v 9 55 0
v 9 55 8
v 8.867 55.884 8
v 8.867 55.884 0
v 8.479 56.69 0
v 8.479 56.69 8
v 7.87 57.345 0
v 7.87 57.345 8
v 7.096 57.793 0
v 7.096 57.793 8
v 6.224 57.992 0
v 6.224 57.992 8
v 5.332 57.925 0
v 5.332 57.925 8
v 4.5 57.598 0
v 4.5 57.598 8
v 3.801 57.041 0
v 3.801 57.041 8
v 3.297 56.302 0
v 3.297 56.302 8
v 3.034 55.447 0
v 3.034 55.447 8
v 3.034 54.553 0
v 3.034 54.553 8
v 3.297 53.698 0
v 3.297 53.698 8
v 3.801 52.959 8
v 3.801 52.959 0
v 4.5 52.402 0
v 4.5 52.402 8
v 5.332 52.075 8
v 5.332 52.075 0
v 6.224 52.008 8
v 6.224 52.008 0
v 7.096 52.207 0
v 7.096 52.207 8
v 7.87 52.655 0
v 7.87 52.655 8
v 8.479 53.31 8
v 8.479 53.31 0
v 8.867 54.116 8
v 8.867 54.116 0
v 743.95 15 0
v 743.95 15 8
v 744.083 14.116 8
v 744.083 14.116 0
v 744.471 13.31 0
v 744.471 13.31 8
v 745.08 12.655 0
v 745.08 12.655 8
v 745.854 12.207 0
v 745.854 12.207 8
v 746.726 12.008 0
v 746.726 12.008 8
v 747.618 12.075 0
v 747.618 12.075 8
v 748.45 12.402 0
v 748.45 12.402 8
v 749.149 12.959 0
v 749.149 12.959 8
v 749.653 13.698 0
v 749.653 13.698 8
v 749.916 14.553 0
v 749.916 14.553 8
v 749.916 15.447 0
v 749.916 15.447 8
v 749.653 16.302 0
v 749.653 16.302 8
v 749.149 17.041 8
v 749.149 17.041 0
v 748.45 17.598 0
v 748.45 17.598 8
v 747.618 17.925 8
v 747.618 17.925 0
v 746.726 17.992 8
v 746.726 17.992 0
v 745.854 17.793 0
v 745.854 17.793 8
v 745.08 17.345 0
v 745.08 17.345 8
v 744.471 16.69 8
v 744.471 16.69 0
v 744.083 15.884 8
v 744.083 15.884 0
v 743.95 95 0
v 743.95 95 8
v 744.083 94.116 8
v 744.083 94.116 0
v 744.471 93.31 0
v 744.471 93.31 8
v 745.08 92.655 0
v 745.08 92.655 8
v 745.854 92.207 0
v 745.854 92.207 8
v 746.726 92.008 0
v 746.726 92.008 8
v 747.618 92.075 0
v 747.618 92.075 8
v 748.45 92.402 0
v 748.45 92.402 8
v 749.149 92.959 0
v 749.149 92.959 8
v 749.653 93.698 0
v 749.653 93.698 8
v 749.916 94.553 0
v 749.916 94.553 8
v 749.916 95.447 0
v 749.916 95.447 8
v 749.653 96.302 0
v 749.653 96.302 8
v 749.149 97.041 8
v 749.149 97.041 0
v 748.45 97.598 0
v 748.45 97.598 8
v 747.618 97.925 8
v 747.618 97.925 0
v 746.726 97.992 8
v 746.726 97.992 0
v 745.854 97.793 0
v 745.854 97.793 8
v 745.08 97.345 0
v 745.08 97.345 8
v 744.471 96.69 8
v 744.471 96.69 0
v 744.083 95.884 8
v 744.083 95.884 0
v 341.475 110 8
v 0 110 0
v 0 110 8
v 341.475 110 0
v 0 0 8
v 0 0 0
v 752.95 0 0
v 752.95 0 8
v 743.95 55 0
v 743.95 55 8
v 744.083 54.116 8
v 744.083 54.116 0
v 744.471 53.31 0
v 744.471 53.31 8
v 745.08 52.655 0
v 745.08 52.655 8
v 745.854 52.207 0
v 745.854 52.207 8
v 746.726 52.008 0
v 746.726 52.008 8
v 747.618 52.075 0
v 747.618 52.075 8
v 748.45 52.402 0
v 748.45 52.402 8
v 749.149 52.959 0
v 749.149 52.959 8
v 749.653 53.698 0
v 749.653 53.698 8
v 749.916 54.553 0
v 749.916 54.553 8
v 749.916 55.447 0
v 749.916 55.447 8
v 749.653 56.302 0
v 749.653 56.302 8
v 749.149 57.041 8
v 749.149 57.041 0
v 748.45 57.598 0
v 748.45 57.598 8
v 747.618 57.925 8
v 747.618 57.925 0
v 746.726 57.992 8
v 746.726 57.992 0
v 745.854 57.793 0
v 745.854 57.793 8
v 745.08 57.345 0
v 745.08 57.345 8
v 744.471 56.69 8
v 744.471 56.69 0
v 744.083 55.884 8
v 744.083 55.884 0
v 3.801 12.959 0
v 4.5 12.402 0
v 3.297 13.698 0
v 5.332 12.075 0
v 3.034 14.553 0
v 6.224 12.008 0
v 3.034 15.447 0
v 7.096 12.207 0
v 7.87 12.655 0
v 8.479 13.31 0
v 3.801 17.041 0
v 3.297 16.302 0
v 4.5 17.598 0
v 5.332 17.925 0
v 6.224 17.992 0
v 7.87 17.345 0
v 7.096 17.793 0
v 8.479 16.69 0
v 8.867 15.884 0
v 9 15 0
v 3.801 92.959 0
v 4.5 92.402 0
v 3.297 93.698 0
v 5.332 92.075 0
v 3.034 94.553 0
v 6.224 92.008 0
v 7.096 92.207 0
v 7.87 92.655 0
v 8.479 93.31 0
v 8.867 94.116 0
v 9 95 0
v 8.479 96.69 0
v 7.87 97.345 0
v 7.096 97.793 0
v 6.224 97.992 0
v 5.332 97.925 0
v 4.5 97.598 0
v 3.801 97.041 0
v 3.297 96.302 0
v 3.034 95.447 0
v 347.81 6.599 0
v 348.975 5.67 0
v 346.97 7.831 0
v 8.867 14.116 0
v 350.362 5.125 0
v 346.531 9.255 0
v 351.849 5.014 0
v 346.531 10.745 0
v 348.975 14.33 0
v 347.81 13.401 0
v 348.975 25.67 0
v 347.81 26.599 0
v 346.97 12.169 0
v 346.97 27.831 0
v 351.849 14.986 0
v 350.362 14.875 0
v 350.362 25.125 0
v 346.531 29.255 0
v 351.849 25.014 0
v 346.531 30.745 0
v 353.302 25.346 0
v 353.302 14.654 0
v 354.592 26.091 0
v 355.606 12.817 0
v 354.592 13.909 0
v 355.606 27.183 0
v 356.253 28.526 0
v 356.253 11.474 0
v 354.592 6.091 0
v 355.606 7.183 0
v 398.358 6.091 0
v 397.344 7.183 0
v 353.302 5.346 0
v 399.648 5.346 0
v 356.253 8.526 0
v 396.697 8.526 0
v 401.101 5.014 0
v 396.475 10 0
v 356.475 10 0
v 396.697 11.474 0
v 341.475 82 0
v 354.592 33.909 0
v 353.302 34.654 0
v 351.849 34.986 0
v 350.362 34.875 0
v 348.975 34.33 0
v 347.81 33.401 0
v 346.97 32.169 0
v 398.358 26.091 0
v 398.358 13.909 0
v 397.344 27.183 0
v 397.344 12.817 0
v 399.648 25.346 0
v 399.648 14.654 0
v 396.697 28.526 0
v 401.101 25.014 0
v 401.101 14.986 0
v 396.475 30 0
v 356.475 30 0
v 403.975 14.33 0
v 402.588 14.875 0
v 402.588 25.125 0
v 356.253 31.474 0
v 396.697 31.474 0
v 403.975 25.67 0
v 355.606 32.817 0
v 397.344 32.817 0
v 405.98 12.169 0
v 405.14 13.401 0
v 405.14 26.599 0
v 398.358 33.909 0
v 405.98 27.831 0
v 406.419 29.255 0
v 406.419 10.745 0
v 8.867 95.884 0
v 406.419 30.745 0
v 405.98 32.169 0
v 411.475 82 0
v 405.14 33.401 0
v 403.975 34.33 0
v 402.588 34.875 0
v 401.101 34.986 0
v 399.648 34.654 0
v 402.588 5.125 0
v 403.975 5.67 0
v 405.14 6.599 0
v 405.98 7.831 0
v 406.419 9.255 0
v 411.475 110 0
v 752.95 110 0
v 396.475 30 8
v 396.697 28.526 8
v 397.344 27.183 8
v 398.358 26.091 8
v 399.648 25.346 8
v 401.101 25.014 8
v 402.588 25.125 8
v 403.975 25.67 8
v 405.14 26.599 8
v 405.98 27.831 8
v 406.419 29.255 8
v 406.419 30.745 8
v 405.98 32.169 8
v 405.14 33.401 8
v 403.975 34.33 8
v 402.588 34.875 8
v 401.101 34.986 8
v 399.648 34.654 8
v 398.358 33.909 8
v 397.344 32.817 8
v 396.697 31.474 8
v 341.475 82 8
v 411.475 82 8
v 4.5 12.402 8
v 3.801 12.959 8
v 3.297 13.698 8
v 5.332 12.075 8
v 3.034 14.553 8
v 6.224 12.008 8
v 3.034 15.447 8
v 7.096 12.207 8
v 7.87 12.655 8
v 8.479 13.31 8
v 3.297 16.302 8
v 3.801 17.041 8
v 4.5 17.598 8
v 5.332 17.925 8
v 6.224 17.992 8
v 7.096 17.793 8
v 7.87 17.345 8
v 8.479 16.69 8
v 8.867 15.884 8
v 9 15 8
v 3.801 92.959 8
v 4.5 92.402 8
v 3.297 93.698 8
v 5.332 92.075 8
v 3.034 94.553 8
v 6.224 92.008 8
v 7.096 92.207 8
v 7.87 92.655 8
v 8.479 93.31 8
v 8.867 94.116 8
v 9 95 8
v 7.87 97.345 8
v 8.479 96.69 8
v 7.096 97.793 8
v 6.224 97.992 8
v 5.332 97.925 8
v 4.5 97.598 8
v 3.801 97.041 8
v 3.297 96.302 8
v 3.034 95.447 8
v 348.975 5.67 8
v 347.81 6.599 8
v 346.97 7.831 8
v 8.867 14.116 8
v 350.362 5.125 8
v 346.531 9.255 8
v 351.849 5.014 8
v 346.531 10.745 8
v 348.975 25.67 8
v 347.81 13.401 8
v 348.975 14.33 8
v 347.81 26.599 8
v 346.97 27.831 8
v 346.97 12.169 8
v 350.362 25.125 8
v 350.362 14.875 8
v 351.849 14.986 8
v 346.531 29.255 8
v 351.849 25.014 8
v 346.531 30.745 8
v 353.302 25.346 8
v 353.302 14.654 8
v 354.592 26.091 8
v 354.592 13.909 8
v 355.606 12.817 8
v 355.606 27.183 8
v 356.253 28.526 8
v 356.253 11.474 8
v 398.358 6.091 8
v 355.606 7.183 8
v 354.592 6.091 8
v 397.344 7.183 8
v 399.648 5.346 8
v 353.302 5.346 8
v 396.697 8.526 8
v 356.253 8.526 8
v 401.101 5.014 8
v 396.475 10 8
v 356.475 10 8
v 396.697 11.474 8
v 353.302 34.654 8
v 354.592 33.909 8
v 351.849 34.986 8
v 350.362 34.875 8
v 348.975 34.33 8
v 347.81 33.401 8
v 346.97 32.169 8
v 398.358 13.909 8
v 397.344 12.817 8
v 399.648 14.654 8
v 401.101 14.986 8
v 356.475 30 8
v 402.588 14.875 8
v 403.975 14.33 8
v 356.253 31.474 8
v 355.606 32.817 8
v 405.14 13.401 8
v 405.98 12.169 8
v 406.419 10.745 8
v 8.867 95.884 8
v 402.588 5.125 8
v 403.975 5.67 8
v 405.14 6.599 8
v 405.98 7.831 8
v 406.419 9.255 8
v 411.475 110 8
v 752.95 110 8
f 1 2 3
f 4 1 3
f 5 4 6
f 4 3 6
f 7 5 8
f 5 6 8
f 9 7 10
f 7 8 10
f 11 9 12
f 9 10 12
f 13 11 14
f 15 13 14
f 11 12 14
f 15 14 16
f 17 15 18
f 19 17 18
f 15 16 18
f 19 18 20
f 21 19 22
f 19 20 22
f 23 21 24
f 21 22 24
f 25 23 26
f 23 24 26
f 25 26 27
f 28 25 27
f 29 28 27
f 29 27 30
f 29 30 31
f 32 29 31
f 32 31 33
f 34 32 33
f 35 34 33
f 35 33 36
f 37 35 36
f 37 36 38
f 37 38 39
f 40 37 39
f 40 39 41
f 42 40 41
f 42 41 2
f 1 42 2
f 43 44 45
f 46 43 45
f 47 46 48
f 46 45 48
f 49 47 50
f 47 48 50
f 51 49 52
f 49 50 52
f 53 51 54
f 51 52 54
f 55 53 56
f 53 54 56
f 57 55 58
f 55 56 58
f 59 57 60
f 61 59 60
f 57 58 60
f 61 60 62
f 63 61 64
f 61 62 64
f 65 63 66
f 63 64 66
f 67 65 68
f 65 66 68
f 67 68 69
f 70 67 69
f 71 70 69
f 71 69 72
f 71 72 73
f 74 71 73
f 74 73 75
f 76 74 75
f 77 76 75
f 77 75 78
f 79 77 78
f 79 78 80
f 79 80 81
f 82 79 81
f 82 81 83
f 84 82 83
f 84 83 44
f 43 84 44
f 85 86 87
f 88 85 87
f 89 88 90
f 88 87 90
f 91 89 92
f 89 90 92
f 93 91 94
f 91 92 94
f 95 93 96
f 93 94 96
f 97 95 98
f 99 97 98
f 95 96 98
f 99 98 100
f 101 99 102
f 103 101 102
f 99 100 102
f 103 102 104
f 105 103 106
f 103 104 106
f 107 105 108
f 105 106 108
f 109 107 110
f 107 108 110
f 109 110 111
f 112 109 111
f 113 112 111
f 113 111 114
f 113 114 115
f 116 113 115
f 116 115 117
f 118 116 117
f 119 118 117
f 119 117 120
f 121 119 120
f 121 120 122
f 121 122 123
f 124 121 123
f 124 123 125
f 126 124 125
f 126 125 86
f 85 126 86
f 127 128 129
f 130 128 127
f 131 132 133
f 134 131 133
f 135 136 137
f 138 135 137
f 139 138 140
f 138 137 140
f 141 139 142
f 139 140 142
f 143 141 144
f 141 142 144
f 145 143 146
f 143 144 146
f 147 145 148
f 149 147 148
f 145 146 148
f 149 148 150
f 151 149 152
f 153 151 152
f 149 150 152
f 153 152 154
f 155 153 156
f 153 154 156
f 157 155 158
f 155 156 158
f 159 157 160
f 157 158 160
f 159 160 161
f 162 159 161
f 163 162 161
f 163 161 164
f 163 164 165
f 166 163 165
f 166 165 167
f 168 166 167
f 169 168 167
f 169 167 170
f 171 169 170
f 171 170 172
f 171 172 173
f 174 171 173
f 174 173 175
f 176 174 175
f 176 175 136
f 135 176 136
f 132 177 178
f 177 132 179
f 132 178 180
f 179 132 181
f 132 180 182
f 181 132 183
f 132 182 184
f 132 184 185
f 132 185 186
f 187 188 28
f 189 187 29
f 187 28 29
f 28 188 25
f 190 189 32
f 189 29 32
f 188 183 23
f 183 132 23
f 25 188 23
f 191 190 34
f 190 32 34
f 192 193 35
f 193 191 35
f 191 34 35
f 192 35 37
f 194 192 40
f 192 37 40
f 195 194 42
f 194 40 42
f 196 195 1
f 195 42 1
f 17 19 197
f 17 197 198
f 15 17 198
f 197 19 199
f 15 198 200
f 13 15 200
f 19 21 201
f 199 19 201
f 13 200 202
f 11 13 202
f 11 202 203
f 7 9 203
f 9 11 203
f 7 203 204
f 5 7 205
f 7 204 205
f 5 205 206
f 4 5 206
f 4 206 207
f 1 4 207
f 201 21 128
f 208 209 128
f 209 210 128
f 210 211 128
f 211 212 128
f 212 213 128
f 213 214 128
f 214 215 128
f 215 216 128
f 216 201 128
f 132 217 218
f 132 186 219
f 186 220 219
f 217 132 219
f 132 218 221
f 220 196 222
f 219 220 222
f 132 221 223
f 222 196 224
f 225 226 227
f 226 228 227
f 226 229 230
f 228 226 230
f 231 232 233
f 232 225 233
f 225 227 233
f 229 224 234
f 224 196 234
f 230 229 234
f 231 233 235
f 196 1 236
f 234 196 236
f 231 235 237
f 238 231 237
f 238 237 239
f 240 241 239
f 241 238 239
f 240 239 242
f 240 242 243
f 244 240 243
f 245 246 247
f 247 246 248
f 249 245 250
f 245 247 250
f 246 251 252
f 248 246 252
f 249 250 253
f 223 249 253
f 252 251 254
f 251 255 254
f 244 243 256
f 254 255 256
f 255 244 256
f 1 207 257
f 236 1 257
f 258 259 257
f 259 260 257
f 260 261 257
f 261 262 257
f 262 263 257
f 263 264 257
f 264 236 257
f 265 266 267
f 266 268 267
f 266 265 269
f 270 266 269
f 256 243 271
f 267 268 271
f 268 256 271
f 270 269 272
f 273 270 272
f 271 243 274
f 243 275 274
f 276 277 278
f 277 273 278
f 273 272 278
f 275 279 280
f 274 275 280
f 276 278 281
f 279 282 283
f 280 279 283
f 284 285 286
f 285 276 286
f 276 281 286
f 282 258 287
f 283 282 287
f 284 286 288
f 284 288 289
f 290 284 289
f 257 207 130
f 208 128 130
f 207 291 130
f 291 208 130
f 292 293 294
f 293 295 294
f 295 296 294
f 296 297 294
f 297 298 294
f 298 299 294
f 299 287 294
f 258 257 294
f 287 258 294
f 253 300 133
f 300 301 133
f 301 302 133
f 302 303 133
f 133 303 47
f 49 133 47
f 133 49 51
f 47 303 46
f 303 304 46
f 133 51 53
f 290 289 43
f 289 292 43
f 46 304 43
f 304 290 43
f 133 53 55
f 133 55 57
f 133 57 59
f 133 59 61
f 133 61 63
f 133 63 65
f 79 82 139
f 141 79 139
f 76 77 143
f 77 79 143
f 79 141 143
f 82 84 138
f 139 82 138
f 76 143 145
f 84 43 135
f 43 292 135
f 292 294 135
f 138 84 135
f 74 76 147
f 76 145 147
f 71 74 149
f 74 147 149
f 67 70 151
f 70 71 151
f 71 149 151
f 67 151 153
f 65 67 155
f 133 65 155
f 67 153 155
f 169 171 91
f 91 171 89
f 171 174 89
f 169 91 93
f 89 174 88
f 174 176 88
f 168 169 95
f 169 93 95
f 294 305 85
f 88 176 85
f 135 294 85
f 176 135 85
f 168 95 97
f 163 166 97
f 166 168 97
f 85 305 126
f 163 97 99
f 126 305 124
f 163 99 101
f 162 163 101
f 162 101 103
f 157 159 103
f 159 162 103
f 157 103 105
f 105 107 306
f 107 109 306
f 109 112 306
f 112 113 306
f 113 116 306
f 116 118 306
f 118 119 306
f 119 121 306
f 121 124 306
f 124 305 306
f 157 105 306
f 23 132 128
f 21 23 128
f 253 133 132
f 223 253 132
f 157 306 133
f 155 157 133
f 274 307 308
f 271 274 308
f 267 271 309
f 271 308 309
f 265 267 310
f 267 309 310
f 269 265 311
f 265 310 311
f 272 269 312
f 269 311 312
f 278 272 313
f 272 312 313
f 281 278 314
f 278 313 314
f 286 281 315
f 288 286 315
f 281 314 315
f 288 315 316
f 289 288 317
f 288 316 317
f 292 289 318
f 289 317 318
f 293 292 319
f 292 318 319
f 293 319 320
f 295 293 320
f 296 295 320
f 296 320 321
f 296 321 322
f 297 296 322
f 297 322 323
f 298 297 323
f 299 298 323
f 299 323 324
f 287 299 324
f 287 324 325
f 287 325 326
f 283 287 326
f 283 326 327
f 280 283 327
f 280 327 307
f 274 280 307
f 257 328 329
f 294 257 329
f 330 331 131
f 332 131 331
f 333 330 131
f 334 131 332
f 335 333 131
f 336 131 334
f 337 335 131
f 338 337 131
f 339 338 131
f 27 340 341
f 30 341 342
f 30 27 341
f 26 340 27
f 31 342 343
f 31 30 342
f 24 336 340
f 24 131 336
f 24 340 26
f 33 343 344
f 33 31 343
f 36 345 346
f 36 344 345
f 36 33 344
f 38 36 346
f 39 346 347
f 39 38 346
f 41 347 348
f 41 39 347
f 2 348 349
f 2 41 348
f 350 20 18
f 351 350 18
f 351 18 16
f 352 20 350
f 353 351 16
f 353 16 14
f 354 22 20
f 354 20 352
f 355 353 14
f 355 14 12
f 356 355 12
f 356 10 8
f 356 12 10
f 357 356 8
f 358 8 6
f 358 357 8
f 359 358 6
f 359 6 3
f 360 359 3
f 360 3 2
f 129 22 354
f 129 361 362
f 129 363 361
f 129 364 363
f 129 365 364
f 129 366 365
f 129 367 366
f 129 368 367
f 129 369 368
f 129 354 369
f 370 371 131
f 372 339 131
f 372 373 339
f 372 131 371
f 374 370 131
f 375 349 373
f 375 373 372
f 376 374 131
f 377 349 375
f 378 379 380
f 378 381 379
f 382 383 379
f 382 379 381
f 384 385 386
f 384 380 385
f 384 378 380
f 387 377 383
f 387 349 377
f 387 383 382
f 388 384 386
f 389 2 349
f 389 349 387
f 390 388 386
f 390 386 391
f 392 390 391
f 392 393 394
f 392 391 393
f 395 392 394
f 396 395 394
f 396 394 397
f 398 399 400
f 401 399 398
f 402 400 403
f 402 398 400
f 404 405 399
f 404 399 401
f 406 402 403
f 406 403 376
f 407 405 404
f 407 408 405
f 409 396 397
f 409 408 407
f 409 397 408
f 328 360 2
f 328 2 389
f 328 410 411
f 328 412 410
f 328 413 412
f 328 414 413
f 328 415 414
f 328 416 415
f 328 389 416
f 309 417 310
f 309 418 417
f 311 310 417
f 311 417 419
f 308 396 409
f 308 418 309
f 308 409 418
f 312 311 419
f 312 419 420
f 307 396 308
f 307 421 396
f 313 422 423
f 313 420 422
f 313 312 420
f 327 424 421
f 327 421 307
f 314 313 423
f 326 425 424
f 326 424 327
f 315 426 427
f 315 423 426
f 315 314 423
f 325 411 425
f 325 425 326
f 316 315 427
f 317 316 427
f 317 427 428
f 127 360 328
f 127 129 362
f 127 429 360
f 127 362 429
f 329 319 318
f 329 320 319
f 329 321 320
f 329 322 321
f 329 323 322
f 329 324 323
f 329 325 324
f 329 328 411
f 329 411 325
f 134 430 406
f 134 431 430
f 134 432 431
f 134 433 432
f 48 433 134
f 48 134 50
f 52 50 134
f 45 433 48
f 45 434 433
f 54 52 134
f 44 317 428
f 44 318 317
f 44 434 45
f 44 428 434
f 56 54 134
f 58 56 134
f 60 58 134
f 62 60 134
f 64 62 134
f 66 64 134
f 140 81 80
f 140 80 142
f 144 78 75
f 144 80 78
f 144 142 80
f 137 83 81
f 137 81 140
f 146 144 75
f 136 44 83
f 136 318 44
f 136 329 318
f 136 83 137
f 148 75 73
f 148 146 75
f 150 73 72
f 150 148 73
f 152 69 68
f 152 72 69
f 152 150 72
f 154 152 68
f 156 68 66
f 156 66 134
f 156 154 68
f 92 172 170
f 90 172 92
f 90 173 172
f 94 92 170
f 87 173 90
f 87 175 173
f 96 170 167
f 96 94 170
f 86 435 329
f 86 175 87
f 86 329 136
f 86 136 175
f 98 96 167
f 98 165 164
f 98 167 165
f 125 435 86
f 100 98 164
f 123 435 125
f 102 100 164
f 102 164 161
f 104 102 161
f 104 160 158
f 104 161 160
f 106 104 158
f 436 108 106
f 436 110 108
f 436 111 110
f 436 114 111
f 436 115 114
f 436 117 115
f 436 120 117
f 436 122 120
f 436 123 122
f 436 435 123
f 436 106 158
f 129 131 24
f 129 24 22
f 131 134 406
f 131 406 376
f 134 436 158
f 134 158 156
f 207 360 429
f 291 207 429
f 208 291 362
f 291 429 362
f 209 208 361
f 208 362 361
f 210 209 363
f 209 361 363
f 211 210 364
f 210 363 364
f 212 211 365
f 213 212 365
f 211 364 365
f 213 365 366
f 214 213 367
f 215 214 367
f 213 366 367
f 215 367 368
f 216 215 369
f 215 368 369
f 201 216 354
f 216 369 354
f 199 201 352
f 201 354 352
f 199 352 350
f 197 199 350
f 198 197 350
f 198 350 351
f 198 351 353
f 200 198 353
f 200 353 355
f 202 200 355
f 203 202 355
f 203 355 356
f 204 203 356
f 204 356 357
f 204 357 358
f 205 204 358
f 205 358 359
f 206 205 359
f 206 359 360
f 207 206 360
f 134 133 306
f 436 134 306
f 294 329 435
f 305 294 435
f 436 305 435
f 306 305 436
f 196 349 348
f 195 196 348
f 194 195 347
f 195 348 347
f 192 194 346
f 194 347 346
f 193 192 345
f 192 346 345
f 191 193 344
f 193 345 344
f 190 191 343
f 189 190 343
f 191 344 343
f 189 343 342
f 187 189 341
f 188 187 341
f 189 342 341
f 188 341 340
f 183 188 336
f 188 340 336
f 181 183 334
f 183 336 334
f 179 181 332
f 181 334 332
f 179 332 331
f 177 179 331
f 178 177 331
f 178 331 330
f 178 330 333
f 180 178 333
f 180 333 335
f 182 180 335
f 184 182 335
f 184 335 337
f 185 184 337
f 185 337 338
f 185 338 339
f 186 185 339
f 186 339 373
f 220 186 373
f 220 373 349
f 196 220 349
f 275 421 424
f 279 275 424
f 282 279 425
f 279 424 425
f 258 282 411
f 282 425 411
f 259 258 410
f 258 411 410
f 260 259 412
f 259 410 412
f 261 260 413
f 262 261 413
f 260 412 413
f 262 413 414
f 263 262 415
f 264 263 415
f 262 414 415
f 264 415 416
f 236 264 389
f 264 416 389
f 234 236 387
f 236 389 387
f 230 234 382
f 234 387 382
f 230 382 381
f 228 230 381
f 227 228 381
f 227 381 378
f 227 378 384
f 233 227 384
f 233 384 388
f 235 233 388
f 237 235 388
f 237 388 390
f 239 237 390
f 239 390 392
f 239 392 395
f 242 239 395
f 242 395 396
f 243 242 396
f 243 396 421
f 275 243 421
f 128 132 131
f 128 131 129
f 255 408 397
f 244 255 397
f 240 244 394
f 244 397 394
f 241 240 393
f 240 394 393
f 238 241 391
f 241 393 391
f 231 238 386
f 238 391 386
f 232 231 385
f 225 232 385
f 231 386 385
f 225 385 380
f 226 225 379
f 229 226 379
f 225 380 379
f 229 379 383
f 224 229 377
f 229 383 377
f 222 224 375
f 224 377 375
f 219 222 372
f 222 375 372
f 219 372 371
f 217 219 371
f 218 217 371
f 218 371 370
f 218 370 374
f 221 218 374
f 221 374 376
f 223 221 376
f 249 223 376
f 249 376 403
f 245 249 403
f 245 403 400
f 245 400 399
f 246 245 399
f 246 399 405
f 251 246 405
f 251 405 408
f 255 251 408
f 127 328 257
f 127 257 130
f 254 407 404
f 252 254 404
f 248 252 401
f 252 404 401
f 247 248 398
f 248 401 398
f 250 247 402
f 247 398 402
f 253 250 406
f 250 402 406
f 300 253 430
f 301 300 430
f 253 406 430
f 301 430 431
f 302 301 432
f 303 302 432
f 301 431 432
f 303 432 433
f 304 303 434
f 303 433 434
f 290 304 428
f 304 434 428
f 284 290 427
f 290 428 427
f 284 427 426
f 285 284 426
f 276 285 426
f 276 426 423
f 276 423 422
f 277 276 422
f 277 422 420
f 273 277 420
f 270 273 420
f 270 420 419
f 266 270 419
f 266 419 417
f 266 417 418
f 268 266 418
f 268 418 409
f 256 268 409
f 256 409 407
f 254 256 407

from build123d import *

# Parameters (mm, degrees)
ESQUISSE1_W             = 752.95
ESQUISSE1_H             = 110
BOSS_EXTRU_1_DEPTH      = 8
ENL_V_MAT_EXTRU_1_REACH = 762.985
ESQUISSE2_R             = 5
ENL_V_MAT_EXTRU_2_REACH = 762.985
ESQUISSE3_R             = 3
ENL_V_MAT_EXTRU_3_REACH = 762.985
ESQUISSE4_W             = 70
ESQUISSE4_H             = 28


with BuildPart() as part:
    # Esquisse1 → Boss.-Extru.1 (new body)
    with BuildSketch(Plane.XY):
        with Locations((376.475, 55)):
            Rectangle(ESQUISSE1_W, ESQUISSE1_H)
    extrude(amount=BOSS_EXTRU_1_DEPTH)

    # Esquisse2 → Enlèv. mat.-Extru.1 (cut, up to next)
    with BuildSketch(Plane.XY.offset(8), mode=Mode.PRIVATE) as enl_v_mat_extru_1_sk1:
        with Locations((351.475, 30)):
            Circle(ESQUISSE2_R)
    enl_v_mat_extru_1_tool1 = extrude(enl_v_mat_extru_1_sk1.sketch, amount=-ENL_V_MAT_EXTRU_1_REACH, mode=Mode.PRIVATE) & part.part
    # Esquisse2 → Enlèv. mat.-Extru.1 (cut, up to next)
    with BuildSketch(Plane.XY.offset(8), mode=Mode.PRIVATE) as enl_v_mat_extru_1_sk2:
        with Locations((351.475, 10)):
            Circle(ESQUISSE2_R)
    enl_v_mat_extru_1_tool2 = extrude(enl_v_mat_extru_1_sk2.sketch, amount=-ENL_V_MAT_EXTRU_1_REACH, mode=Mode.PRIVATE) & part.part
    # Esquisse2 → Enlèv. mat.-Extru.1 (cut, up to next)
    with BuildSketch(Plane.XY.offset(8), mode=Mode.PRIVATE) as enl_v_mat_extru_1_sk3:
        with Locations(Location((401.475, 30, 0), (0, 0, 180))):
            Circle(ESQUISSE2_R)
    enl_v_mat_extru_1_tool3 = extrude(enl_v_mat_extru_1_sk3.sketch, amount=-ENL_V_MAT_EXTRU_1_REACH, mode=Mode.PRIVATE) & part.part
    # Esquisse2 → Enlèv. mat.-Extru.1 (cut, up to next)
    with BuildSketch(Plane.XY.offset(8), mode=Mode.PRIVATE) as enl_v_mat_extru_1_sk4:
        with Locations(Location((401.475, 10, 0), (0, 0, 180))):
            Circle(ESQUISSE2_R)
    enl_v_mat_extru_1_tool4 = extrude(enl_v_mat_extru_1_sk4.sketch, amount=-ENL_V_MAT_EXTRU_1_REACH, mode=Mode.PRIVATE) & part.part
    add(enl_v_mat_extru_1_tool1.solids().sort_by_distance((351.475, 30, 8))[0], mode=Mode.SUBTRACT)
    add(enl_v_mat_extru_1_tool2.solids().sort_by_distance((351.475, 10, 8))[0], mode=Mode.SUBTRACT)
    add(enl_v_mat_extru_1_tool3.solids().sort_by_distance((401.475, 30, 8))[0], mode=Mode.SUBTRACT)
    add(enl_v_mat_extru_1_tool4.solids().sort_by_distance((401.475, 10, 8))[0], mode=Mode.SUBTRACT)

    # Esquisse3 → Enlèv. mat.-Extru.2 (cut, up to next)
    with BuildSketch(Plane.XY.offset(8), mode=Mode.PRIVATE) as enl_v_mat_extru_2_sk1:
        with Locations((6, 95)):
            Circle(ESQUISSE3_R)
    enl_v_mat_extru_2_tool1 = extrude(enl_v_mat_extru_2_sk1.sketch, amount=-ENL_V_MAT_EXTRU_2_REACH, mode=Mode.PRIVATE) & part.part
    # Esquisse3 → Enlèv. mat.-Extru.2 (cut, up to next)
    with BuildSketch(Plane.XY.offset(8), mode=Mode.PRIVATE) as enl_v_mat_extru_2_sk2:
        with Locations((6, 55)):
            Circle(ESQUISSE3_R)
    enl_v_mat_extru_2_tool2 = extrude(enl_v_mat_extru_2_sk2.sketch, amount=-ENL_V_MAT_EXTRU_2_REACH, mode=Mode.PRIVATE) & part.part
    # Esquisse3 → Enlèv. mat.-Extru.2 (cut, up to next)
    with BuildSketch(Plane.XY.offset(8), mode=Mode.PRIVATE) as enl_v_mat_extru_2_sk3:
        with Locations((6, 15)):
            Circle(ESQUISSE3_R)
    enl_v_mat_extru_2_tool3 = extrude(enl_v_mat_extru_2_sk3.sketch, amount=-ENL_V_MAT_EXTRU_2_REACH, mode=Mode.PRIVATE) & part.part
    # Esquisse3 → Enlèv. mat.-Extru.2 (cut, up to next)
    with BuildSketch(Plane.XY.offset(8), mode=Mode.PRIVATE) as enl_v_mat_extru_2_sk4:
        with Locations(Location((746.95, 15, 0), (0, 0, 180))):
            Circle(ESQUISSE3_R)
    enl_v_mat_extru_2_tool4 = extrude(enl_v_mat_extru_2_sk4.sketch, amount=-ENL_V_MAT_EXTRU_2_REACH, mode=Mode.PRIVATE) & part.part
    # Esquisse3 → Enlèv. mat.-Extru.2 (cut, up to next)
    with BuildSketch(Plane.XY.offset(8), mode=Mode.PRIVATE) as enl_v_mat_extru_2_sk5:
        with Locations(Location((746.95, 55, 0), (0, 0, 180))):
            Circle(ESQUISSE3_R)
    enl_v_mat_extru_2_tool5 = extrude(enl_v_mat_extru_2_sk5.sketch, amount=-ENL_V_MAT_EXTRU_2_REACH, mode=Mode.PRIVATE) & part.part
    # Esquisse3 → Enlèv. mat.-Extru.2 (cut, up to next)
    with BuildSketch(Plane.XY.offset(8), mode=Mode.PRIVATE) as enl_v_mat_extru_2_sk6:
        with Locations(Location((746.95, 95, 0), (0, 0, 180))):
            Circle(ESQUISSE3_R)
    enl_v_mat_extru_2_tool6 = extrude(enl_v_mat_extru_2_sk6.sketch, amount=-ENL_V_MAT_EXTRU_2_REACH, mode=Mode.PRIVATE) & part.part
    add(enl_v_mat_extru_2_tool1.solids().sort_by_distance((6, 95, 8))[0], mode=Mode.SUBTRACT)
    add(enl_v_mat_extru_2_tool2.solids().sort_by_distance((6, 55, 8))[0], mode=Mode.SUBTRACT)
    add(enl_v_mat_extru_2_tool3.solids().sort_by_distance((6, 15, 8))[0], mode=Mode.SUBTRACT)
    add(enl_v_mat_extru_2_tool4.solids().sort_by_distance((746.95, 15, 8))[0], mode=Mode.SUBTRACT)
    add(enl_v_mat_extru_2_tool5.solids().sort_by_distance((746.95, 55, 8))[0], mode=Mode.SUBTRACT)
    add(enl_v_mat_extru_2_tool6.solids().sort_by_distance((746.95, 95, 8))[0], mode=Mode.SUBTRACT)

    # Esquisse4 → Enlèv. mat.-Extru.3 (cut, up to next)
    with BuildSketch(Plane.XY.offset(8), mode=Mode.PRIVATE) as enl_v_mat_extru_3_sk1:
        with Locations((376.475, 96)):
            Rectangle(ESQUISSE4_W, ESQUISSE4_H)
    enl_v_mat_extru_3_tool1 = extrude(enl_v_mat_extru_3_sk1.sketch, amount=-ENL_V_MAT_EXTRU_3_REACH, mode=Mode.PRIVATE) & part.part
    add(enl_v_mat_extru_3_tool1.solids().sort_by_distance((376.475, 96, 8))[0], mode=Mode.SUBTRACT)


solid = part.part
